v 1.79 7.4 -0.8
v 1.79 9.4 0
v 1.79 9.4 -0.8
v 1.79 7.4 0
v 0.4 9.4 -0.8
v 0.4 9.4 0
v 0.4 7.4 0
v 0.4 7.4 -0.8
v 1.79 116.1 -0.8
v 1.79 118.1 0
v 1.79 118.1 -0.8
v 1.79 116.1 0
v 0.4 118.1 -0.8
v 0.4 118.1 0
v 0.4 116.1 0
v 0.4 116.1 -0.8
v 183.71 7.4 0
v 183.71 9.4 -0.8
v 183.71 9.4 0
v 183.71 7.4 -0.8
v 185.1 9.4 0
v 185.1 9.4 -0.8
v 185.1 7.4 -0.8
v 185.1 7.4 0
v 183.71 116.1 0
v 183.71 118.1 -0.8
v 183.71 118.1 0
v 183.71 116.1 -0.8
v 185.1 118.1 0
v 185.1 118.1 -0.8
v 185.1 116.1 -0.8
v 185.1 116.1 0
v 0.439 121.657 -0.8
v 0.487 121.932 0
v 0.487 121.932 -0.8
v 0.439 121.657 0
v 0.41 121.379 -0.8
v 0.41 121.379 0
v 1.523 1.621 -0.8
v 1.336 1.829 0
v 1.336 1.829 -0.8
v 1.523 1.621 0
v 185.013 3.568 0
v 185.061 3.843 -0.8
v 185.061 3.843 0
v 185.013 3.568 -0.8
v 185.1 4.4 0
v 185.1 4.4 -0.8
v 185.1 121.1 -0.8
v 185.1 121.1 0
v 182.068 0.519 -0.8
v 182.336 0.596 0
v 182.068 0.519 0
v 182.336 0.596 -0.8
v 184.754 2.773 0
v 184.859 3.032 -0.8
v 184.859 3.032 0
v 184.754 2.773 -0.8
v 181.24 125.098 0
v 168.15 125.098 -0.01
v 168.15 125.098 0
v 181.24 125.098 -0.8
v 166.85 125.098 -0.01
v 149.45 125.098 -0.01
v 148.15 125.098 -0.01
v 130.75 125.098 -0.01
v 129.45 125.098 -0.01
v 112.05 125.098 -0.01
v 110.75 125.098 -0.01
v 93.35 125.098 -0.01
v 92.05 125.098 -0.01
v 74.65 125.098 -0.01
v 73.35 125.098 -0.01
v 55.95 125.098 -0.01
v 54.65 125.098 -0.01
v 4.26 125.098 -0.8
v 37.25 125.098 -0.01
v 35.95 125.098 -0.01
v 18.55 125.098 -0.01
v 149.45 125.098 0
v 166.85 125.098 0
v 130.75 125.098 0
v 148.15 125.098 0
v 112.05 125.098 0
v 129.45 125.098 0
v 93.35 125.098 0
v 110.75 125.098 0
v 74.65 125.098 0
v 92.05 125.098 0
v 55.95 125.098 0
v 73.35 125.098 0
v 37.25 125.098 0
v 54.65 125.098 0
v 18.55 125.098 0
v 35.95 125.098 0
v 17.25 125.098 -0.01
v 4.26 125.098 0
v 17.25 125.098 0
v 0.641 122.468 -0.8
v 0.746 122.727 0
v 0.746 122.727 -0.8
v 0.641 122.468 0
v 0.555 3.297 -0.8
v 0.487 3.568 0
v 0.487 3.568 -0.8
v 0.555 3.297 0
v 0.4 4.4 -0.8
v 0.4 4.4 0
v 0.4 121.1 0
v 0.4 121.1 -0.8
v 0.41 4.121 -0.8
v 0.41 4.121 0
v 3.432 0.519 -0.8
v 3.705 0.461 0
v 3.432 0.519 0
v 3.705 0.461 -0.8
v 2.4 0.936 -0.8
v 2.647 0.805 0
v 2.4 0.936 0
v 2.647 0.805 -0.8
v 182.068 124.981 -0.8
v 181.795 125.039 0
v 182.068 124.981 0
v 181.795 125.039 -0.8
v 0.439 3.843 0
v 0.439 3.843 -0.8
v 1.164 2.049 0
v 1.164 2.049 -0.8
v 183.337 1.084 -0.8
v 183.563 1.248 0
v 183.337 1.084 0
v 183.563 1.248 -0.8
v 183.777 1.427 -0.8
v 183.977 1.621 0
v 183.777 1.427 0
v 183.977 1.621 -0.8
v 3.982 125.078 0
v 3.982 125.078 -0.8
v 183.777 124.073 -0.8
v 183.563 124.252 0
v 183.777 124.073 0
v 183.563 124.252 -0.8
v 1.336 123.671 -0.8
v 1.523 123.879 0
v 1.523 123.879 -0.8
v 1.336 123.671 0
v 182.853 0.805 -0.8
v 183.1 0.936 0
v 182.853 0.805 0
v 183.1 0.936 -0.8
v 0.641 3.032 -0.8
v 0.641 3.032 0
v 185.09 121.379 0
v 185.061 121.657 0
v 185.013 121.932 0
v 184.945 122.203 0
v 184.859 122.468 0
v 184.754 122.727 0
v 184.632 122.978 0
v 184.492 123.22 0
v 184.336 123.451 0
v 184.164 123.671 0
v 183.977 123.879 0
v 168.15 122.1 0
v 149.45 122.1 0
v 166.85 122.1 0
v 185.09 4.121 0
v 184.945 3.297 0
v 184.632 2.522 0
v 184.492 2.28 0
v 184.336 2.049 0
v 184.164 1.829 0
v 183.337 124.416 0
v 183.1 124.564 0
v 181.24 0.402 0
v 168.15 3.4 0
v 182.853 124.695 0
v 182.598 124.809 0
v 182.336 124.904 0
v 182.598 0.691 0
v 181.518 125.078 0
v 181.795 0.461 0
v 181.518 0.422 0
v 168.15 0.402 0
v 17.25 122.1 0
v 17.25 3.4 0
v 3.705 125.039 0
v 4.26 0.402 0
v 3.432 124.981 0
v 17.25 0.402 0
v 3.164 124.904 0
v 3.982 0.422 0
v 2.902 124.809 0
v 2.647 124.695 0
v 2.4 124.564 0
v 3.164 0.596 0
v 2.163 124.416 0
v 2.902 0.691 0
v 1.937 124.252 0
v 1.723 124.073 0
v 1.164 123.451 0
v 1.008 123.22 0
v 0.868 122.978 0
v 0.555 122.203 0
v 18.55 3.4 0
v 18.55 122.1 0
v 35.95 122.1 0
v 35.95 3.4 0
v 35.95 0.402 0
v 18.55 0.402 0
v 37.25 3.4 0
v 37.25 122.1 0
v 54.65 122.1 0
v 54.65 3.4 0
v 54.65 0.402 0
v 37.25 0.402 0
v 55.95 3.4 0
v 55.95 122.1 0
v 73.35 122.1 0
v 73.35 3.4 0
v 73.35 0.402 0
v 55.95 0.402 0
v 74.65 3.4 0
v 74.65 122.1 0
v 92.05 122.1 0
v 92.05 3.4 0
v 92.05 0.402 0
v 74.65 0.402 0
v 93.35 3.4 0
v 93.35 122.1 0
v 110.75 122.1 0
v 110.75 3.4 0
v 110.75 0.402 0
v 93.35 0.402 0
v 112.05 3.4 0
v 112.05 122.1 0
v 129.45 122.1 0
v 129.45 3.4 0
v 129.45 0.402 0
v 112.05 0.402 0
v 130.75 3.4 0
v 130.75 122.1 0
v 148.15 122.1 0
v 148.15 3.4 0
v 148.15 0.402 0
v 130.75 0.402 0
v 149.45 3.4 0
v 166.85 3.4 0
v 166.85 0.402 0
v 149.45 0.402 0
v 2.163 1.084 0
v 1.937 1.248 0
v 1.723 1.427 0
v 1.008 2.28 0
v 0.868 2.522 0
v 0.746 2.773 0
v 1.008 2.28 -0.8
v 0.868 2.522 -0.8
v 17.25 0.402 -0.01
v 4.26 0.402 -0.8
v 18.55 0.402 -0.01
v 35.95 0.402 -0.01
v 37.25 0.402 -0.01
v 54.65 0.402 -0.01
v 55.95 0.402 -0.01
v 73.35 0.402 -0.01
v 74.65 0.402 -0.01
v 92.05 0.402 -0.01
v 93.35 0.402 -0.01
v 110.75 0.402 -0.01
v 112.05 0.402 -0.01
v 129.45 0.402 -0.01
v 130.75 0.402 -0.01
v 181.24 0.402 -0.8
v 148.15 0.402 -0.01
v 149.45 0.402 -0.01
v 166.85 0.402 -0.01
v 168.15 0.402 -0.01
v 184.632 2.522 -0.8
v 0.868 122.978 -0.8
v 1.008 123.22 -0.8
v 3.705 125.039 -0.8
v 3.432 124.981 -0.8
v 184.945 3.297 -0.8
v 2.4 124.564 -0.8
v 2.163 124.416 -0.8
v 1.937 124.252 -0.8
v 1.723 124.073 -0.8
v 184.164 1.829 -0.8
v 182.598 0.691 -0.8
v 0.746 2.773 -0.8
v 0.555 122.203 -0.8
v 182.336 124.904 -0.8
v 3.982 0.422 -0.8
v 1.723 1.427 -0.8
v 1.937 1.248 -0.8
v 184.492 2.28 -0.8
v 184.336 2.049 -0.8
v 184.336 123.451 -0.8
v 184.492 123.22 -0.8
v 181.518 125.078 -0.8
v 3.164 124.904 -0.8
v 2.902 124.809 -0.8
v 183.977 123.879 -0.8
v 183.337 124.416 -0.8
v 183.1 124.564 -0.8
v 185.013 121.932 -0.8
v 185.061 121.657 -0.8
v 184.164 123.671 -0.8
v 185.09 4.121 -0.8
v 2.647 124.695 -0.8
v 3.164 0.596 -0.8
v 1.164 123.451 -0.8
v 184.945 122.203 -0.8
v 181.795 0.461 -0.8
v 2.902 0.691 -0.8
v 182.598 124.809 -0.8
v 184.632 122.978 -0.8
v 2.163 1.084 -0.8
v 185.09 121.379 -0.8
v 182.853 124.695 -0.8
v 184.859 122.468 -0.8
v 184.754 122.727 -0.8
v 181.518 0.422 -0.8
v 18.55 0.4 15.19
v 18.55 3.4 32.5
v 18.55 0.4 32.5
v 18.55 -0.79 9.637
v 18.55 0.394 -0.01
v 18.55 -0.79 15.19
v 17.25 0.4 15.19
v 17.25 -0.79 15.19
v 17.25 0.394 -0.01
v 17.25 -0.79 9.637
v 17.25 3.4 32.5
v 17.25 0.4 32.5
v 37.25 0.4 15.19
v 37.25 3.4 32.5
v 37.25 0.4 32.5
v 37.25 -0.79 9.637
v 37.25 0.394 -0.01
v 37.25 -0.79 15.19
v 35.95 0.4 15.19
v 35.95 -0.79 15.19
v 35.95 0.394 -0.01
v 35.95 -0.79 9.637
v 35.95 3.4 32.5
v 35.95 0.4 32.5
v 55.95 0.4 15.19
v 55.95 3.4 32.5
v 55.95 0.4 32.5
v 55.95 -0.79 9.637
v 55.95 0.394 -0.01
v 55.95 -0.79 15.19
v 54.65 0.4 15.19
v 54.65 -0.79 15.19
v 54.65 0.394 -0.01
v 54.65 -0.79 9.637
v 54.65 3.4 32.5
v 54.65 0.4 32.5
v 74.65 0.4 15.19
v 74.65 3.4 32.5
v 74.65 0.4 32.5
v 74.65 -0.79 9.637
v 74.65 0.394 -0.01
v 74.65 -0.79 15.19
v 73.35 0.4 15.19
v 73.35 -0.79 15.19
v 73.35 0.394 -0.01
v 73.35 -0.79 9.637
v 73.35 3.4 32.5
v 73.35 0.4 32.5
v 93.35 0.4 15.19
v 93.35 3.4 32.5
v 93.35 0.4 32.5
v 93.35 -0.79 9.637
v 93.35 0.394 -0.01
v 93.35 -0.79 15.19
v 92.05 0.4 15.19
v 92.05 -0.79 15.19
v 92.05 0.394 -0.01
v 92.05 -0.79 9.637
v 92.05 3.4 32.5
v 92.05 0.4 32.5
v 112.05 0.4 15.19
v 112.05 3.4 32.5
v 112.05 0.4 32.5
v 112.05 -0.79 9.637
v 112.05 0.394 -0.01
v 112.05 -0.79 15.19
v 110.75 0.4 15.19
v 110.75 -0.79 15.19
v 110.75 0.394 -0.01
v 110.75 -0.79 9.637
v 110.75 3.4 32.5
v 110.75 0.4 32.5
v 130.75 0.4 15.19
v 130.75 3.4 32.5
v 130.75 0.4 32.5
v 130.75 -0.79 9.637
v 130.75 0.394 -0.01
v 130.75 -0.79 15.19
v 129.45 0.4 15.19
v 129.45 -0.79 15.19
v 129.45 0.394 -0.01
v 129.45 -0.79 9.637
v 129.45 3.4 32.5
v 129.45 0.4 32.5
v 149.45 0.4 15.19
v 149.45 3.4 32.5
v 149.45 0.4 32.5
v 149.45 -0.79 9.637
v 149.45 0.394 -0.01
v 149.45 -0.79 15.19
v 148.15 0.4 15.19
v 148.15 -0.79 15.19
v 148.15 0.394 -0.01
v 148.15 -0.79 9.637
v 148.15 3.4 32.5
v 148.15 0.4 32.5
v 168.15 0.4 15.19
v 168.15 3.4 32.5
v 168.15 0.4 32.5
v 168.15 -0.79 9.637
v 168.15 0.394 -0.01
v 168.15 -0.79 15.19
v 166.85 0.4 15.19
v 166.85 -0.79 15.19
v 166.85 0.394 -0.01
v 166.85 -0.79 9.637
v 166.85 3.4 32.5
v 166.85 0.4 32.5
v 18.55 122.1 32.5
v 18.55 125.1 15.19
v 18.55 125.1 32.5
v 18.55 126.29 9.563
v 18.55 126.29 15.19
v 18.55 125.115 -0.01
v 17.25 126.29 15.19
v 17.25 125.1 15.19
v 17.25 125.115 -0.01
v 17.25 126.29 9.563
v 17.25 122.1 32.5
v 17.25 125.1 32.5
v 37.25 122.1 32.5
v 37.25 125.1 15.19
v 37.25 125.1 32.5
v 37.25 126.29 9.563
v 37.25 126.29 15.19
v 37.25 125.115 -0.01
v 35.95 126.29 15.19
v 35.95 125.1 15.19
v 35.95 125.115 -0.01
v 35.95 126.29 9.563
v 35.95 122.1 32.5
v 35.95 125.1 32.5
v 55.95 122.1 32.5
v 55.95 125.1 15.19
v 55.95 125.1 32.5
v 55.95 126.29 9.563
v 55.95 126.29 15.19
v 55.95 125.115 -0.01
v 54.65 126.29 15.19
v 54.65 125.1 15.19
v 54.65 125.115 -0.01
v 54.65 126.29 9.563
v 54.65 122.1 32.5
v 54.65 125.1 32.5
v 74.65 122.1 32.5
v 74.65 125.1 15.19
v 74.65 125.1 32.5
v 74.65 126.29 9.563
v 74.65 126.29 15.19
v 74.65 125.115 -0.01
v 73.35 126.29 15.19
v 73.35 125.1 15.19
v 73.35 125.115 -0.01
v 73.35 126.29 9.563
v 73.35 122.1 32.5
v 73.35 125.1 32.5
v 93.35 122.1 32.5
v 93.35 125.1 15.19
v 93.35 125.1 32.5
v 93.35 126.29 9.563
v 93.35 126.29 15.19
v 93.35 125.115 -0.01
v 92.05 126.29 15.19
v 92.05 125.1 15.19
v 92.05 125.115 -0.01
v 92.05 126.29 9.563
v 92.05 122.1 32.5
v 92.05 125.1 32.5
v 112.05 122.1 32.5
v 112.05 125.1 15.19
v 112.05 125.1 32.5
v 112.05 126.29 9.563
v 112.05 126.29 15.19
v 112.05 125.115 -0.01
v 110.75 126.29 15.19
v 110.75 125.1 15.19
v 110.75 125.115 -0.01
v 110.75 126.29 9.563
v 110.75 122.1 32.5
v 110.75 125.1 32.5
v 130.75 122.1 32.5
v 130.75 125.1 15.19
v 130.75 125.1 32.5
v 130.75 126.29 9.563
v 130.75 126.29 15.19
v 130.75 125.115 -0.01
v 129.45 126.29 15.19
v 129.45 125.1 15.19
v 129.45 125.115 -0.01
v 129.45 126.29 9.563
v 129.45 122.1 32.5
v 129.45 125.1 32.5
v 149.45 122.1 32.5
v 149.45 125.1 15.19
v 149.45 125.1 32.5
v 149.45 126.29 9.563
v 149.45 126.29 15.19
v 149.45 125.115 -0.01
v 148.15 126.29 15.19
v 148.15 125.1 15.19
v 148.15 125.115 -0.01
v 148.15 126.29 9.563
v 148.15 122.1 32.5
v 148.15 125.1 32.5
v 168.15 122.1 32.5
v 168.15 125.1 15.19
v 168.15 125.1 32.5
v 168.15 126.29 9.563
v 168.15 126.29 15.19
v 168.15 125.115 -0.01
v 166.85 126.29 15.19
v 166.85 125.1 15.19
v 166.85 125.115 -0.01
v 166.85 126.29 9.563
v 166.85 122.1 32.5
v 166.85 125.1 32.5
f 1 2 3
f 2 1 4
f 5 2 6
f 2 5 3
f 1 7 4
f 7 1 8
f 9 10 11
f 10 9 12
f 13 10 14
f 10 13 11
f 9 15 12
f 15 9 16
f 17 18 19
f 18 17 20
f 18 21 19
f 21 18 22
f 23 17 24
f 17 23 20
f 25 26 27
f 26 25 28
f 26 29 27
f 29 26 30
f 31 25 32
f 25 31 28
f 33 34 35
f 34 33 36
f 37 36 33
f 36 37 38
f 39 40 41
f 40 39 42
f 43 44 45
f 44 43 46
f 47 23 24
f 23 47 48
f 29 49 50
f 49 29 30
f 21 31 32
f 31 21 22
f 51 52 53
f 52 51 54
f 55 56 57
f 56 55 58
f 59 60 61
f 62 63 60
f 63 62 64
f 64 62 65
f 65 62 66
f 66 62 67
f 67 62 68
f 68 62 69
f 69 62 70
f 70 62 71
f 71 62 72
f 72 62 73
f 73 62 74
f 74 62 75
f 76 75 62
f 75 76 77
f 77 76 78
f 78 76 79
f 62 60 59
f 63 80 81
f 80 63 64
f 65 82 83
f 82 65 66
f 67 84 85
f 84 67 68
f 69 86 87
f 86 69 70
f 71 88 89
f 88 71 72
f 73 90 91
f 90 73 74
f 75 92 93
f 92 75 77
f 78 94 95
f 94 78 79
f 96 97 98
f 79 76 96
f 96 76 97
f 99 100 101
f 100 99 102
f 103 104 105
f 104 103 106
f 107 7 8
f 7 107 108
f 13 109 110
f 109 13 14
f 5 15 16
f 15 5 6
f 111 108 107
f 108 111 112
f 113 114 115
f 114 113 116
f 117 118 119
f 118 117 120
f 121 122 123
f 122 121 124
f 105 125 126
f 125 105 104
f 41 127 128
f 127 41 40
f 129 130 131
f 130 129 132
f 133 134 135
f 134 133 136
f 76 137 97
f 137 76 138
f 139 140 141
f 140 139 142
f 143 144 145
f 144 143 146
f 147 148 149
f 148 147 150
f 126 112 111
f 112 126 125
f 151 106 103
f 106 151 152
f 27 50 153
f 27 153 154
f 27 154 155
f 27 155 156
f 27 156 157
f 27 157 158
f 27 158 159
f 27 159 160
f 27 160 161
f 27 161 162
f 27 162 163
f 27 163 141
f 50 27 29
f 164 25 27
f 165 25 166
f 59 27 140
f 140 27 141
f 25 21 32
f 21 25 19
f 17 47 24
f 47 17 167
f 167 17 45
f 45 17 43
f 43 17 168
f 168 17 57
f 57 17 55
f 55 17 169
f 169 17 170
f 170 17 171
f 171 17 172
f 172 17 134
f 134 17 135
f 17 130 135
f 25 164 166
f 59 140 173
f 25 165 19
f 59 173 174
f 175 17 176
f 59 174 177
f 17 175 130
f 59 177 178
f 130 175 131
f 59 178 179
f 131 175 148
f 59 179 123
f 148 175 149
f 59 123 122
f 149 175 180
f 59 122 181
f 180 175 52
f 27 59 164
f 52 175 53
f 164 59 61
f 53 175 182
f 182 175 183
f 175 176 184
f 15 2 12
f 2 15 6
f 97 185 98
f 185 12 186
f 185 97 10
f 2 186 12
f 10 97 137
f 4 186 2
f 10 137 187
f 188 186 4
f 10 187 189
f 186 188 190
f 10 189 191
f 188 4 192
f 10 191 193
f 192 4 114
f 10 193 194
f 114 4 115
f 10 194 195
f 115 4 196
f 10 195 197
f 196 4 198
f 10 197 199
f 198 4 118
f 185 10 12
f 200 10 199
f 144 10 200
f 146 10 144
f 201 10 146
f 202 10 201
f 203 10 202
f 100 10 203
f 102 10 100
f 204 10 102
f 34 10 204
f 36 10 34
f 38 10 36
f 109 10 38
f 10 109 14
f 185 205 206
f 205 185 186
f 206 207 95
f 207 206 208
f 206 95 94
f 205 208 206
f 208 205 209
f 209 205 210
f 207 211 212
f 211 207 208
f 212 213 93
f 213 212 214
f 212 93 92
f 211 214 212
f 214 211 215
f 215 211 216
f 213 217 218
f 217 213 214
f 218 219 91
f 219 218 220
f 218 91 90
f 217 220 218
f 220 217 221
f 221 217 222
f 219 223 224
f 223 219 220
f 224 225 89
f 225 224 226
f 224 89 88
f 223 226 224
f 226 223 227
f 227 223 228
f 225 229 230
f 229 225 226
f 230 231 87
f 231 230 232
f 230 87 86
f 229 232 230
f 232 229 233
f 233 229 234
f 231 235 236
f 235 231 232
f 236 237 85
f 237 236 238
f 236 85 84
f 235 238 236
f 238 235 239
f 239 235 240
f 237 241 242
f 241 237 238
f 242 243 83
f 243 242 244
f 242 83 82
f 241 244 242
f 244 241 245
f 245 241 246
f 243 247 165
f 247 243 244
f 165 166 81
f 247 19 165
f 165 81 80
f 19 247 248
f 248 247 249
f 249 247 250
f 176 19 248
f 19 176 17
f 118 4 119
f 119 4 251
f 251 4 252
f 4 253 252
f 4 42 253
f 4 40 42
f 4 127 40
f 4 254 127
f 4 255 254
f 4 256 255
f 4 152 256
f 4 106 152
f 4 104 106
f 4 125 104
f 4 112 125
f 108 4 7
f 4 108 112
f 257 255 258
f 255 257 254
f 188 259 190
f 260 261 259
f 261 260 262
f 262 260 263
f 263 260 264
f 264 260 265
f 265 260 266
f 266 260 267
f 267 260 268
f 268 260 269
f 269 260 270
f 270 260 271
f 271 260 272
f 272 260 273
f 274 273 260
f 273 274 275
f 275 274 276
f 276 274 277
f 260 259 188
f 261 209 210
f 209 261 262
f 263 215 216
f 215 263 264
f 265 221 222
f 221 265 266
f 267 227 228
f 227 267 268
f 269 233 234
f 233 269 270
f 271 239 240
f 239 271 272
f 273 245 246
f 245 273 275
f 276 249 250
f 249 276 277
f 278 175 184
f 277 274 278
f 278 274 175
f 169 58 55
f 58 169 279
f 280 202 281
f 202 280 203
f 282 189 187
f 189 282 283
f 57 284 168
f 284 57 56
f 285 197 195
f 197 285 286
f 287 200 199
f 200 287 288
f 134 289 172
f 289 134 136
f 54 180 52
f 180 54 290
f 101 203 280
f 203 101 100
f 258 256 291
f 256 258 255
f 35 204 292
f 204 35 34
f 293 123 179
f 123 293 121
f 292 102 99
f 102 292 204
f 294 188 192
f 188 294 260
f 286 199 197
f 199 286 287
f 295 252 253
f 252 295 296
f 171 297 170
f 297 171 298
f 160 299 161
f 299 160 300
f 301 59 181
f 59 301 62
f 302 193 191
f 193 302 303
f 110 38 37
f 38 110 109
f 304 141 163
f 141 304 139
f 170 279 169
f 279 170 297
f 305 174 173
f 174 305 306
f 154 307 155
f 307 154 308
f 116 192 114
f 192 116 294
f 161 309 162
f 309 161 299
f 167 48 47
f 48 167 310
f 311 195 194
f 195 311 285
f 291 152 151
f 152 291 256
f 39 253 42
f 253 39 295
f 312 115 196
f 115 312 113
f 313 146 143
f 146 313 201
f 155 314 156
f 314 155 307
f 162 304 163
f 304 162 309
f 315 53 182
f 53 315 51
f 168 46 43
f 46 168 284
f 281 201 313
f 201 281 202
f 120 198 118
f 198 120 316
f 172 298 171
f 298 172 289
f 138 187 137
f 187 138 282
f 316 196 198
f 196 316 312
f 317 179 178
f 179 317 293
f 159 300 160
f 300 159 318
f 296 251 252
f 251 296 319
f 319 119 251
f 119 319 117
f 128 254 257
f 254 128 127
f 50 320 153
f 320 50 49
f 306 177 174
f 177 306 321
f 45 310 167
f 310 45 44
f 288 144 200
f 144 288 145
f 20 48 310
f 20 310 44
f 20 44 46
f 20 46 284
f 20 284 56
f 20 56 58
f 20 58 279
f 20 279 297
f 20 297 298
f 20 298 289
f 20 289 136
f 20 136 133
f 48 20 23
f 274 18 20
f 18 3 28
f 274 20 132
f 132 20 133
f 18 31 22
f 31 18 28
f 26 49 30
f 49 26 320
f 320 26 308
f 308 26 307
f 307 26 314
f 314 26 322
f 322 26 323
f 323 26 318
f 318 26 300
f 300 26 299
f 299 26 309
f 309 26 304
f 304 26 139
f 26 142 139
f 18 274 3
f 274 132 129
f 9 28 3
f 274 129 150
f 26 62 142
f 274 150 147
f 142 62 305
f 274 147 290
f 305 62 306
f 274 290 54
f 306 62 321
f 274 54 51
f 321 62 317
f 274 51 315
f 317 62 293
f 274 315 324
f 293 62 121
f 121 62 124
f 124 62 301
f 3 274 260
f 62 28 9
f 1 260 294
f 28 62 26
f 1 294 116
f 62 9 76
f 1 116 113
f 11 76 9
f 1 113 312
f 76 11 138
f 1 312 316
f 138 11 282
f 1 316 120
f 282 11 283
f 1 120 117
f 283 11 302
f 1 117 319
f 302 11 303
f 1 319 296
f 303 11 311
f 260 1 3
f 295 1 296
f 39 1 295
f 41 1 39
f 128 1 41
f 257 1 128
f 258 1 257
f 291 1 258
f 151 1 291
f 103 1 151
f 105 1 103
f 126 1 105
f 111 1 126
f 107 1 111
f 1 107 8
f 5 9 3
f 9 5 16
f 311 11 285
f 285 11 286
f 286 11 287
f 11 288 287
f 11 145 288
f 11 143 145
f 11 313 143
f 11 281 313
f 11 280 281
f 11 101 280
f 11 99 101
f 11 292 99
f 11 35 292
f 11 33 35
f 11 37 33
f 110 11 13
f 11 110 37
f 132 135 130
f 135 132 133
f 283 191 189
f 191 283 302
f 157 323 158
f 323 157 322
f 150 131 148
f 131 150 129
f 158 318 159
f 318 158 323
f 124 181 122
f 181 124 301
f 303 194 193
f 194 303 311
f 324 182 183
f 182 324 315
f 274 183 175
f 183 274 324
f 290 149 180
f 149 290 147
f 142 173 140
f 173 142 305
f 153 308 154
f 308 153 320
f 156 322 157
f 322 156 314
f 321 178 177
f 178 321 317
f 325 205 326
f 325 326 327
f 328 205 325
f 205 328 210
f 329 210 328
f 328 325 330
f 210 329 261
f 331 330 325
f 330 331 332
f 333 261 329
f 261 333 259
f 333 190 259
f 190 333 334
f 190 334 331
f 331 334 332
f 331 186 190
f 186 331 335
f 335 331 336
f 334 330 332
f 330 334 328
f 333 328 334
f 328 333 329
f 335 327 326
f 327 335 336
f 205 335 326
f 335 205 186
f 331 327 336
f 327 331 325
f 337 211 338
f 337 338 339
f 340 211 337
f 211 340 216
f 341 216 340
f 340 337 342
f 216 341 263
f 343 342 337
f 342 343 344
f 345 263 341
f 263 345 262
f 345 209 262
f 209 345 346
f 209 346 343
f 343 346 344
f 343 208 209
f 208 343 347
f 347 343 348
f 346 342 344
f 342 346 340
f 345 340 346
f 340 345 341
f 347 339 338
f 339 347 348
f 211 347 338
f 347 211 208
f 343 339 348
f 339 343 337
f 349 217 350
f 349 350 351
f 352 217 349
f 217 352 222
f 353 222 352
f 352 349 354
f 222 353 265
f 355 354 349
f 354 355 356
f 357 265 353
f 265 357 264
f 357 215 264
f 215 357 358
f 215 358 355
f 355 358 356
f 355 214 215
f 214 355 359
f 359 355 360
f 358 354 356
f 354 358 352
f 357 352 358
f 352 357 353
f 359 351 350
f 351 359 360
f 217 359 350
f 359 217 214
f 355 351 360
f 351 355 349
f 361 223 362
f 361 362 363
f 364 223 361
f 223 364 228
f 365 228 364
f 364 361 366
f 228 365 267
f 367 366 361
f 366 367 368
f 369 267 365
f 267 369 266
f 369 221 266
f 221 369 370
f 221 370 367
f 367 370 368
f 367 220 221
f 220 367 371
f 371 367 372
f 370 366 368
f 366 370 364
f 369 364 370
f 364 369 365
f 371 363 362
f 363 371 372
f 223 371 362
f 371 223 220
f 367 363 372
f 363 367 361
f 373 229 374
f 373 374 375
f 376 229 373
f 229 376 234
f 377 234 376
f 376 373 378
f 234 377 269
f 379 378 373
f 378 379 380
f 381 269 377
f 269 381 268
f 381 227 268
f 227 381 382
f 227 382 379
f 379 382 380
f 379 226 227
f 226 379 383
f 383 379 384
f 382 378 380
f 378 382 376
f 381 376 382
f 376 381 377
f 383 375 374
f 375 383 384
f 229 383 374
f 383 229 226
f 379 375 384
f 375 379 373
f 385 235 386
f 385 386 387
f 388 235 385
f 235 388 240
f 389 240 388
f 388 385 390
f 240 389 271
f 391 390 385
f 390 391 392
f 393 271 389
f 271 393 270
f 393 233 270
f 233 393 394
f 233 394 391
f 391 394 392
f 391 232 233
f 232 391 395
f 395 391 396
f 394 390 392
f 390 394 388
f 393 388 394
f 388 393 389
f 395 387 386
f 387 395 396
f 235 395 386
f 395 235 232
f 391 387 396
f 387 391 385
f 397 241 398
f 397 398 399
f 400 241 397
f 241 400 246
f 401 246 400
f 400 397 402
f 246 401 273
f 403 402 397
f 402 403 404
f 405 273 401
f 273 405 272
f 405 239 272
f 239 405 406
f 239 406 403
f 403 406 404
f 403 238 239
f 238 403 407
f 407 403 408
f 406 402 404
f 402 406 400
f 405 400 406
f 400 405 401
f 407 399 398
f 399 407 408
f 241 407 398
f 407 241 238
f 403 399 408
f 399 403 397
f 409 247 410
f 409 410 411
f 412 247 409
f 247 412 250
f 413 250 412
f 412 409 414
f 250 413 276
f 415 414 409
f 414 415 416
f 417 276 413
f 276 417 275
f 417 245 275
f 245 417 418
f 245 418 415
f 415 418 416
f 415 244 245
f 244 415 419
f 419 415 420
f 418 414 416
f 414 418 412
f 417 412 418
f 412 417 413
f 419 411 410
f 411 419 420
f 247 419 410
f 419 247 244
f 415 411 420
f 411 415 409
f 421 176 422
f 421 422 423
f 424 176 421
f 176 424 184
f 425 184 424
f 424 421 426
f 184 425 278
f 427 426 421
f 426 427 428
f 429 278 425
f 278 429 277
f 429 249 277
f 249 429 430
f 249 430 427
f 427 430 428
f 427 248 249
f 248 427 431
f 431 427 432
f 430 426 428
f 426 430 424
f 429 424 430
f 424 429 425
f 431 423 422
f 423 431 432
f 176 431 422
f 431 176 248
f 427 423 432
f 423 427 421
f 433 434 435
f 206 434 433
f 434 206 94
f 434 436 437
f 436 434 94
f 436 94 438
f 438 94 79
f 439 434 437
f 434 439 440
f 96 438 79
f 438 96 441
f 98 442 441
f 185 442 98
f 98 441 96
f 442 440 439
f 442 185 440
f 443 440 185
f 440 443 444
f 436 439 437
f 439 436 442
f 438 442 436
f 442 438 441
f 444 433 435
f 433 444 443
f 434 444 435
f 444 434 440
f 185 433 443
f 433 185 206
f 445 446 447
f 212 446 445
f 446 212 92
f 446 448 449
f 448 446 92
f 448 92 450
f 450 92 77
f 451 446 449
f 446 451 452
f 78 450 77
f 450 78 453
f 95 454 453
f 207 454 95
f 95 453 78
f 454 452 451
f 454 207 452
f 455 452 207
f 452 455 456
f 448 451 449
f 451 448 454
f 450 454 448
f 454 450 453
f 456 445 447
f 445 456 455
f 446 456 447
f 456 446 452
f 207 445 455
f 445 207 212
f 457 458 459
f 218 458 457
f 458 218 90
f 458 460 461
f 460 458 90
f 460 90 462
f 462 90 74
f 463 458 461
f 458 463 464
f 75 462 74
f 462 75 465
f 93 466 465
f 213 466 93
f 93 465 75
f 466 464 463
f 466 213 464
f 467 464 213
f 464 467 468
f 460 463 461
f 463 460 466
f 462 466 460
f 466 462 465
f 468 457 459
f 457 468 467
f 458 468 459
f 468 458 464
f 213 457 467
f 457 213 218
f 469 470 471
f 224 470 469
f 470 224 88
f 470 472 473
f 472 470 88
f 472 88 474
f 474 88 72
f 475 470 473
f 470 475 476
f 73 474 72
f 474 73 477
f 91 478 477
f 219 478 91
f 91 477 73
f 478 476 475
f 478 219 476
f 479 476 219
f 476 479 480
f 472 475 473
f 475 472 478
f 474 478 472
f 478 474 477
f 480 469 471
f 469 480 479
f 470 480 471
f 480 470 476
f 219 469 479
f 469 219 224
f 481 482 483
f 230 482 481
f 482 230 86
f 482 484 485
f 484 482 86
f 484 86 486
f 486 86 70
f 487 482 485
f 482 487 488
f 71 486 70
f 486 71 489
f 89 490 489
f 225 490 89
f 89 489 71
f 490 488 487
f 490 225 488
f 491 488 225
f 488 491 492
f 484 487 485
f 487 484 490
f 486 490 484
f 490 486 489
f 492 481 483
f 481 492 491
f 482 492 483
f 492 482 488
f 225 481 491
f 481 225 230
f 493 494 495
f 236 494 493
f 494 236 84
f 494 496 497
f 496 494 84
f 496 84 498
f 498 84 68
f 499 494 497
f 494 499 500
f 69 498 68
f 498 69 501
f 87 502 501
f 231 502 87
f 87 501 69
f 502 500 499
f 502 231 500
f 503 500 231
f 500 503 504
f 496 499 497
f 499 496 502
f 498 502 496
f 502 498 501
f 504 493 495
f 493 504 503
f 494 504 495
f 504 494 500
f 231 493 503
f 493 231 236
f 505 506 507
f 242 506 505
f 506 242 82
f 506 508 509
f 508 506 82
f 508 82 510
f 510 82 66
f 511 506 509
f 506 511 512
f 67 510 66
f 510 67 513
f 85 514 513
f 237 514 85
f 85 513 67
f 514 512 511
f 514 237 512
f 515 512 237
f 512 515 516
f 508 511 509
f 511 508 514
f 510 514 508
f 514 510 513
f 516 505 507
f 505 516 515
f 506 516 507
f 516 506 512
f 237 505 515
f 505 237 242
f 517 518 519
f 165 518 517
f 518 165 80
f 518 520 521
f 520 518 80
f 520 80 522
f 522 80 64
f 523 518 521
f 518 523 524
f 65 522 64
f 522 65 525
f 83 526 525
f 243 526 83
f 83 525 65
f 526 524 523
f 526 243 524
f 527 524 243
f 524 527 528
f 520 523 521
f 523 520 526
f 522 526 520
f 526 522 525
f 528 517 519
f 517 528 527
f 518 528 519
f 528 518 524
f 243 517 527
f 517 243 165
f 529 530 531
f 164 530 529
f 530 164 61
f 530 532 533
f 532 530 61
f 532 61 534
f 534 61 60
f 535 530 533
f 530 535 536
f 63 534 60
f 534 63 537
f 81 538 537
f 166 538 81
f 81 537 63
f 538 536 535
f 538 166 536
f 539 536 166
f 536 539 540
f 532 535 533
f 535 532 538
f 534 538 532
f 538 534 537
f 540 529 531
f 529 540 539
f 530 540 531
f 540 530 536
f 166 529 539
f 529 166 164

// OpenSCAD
// file: ../../Base/Constants.scad
// Fischertechnik Box Foundation
// Constants

// Constant values necessary for multiple elements

// Base constants
dividerThickness = 1.2;
excess = 0.01;
fragments = 90;
tolerance = 0.8;

// Gets the thickness of a divider 
function getDividerThickness() = dividerThickness;

// Gets the excess that is used to merge walls into each other
function getExcess() = excess;

// Gets amount of fragments of a cylinder
function getFragments() = fragments;

// Gets the inner tolerance of a frame to each side
function getTolerance() = tolerance;


// Fischertechnik specific constants
axisDiameter = 4;
axisBottomDiameter = axisDiameter + 1;
axisTolerance = 0.2;

// Gets axis diameter of Fischertechnik axis
function getAxisDiameter() = axisDiameter;

// Gets axis diameter tolerance (subtracted for element axis)
function getAxisTolerance() = axisTolerance;

// Gets the axis diameter for standing axis
function getStandAxisDiameter() = getAxisDiameter() - getAxisTolerance();

// Gets axis bottom diameter for thicker part at the bottom
function getAxisBottomDiameter() = axisBottomDiameter;

standardEdgeDistance = 2.5;
standardWebDistance = 11.5;
standardCornerLength = 15;

// gets the standard distance to the wall of the box for dockable frames with webs
function getStandardEdgeDistance() = standardEdgeDistance;

// gets the standard distance of each web to the corner of the dockable frame
function getStandardWebDistance() = standardWebDistance;

// gets the standard length of the corner walls of a dockable frame
function getStandardCornerLength() = standardCornerLength;

tubeWallFactor = 0.8;

// gets the wall thickness of a tube.
function getTubeWallThickness() = tubeWallFactor * getDividerThickness();

smallPartsFrameHeight = 20;

// gets the frame height for docked small parts boxes.
function getSmallPartsFrameHeight() = smallPartsFrameHeight;

hubRingDiameter = 19.5;
hubRingLevelDiameter = 21;

// gets the diameter of a tube matching the inner ring of a wheel
function getHubRingDiameter() = hubRingDiameter;

// gets the diameter of a hub tube with a thicker diameter
function getHubRingLevelDiameter() = hubRingLevelDiameter;
// file: ../../Base/PlacementOptions.scad
// Fischertechnik Box Foundation
// Placement Options

// Alignment
NoAlign = 0;
AlignLeft = 1;
AlignBottom = 2;
AlignCenter = 3;
AlignRight = 4;
AlignTop = 5;

// Element rotation degree steps
rotations = [0, -90, -180, -270];

// Rotation
NoRotation = 0;
Rotate0 = 0;
Rotate90 = 1;
Rotate180 = 2;
Rotate270 = 3;

// Docking (seen from above)
NoDock = -1;
DockLeft = 0;
DockTop = 1;
DockRight = 2;
DockCorner = 2;
DockBottom = 3;

// Web corners
LowerLeft = 0;
UpperLeft = 1;
UpperRight = 2;
LowerRight = 3;

// Web position relative to corner
LeftOfCorner = 0;
RightOfCorner = 1;
// file: ../../Base/BoxInlays.scad
// Fischertechnik Box Foundation
// Box Inlays for Original Sorting Boxes

use <Constants.scad>
use <Boxes.scad>

include <PlacementOptions.scad>

box500Width = 380;
box500Depth = 190;

baseThickness = 0.8;
radius = 4;

// getInlayBaseSpace(space)
// Gets the usable space of an inlay with the specified size.
// space = The size of the bottom of the inlay without tolerance

function getInlayBaseSpace(space) = [space.x - getTolerance(), space.y - getTolerance()];

// Creates the bottom with the specified size.
// space = The size of the bottom

module InlayBase(space) {
    module WebCutoffs() {
        distance = 7;
        width = 1.4;
        depth = 2;
        thickness = baseThickness * 2;
        cutoffVolume = [width, depth, thickness];

        translate([0, 0, -baseThickness/2]) {
            translate([-getExcess(), 0]) {
                translate([0, distance])
                    cube(cutoffVolume);
                translate([0, getInlayBaseSpace(space).y - distance - depth])
                    cube(cutoffVolume);
            }
            translate([getInlayBaseSpace(space).x - width + getExcess(), 0]) {
                translate([0, distance])
                    cube(cutoffVolume);
                translate([0, getInlayBaseSpace(space).y - distance - depth])
                    cube(cutoffVolume);
            }
        }
    }

    difference() {
        RoundedCornerPlate(space.x - getTolerance(), space.y - getTolerance(), baseThickness, radius);
        WebCutoffs();
    }
}

halfTolerance = getTolerance()/2;

// Creates an inlay for the Fischertechnik empty box 130x190 mm and places it at position 0,0
// The inlay consists of a thin layer at the bottom where the elements are placed. Use 
// Box190InlayWeb to place webs that hold the inlay in position.

module Box190Inlay() {
    translate([halfTolerance, halfTolerance, -baseThickness]) {            
        InlayBase(getBox190Space());
    }
}

inlayWebDepth = 3;

// Box190InlayWeb(align, position)
// Creates a web for snapping the inlay into the box. Use multiple webs per side.
// align = AlignTop or AlignBottom
// position = Index of the recess in the boy where to snap in (from left to right)
// inlayWebDepth = Depth of the web (default is 3 mm)

module Box190InlayWeb(align, position, inlayWebDepth=inlayWebDepth) {

    inlayWebThickness = 1.3;
    inlayWebHeight = getBoxUsageHeight();    
    
    inlayWebRecessHeight = 15.6;
    inlayWebRecessDepth = 1.2;
    inlayWebRecessAngle = 7.0;

    inlayWebRecessWidth = 1.4;
    inlayWebCount = 9;
    inlayWebCompleteWidth = 151.0;
    inlayWebDistance = (inlayWebCompleteWidth - inlayWebCount * inlayWebRecessWidth) / (inlayWebCount - 1) + inlayWebRecessWidth;
    inlayWebStart = (getBox190Space().x - inlayWebCompleteWidth) / 2;

    module InlayWeb() {
        cube([inlayWebThickness, inlayWebDepth, inlayWebHeight + getExcess()]);
        translate([0, align==AlignTop ? (inlayWebDepth-getExcess()) : (getExcess()-inlayWebRecessDepth)]) {
            difference() {
                cube([inlayWebThickness, inlayWebRecessDepth, inlayWebRecessHeight - halfTolerance]);
                translate([-getExcess(), 0, -0.2])
                    rotate([align==AlignTop ? -inlayWebRecessAngle : inlayWebRecessAngle,0,0])
                        cube([inlayWebThickness+2*getExcess(), inlayWebRecessDepth, inlayWebRecessHeight]);
            }
        }
    }
    
    x = inlayWebStart + position * inlayWebDistance;
    y = (align == AlignTop) ? (getBox190Space().y - inlayWebDepth - halfTolerance) : halfTolerance;

    translate([x, y, -getExcess()])
        InlayWeb();
}
// file: ../../Base/Boxes.scad
// Fischertechnik Box Foundation
// Pre-designed Boxes

use <Constants.scad>

include <PlacementOptions.scad>

box190Width = 190;
box190Depth = 130;
box130Width = 130;
box130Depth = 95;

// Values are from an original ec3 box
topBottomDifference = 1.5;
outerHeight = 40;
innerHeight = 38.2;
baseThickness = outerHeight - innerHeight;
stackExcess = 5.7;
radius = 3.5;
wallThickness = 1.5;
tolerance = 0.2;
stackOffset = innerHeight - stackExcess;

boxUsageHeight = stackOffset;
boxWallThickness = wallThickness;
boxBaseThickness = baseThickness;
boxWebWidth = 3.0;

// getBoxWallThickness()
// Gets the wall thickness of a Fischertechnik Box
function getBoxWallThickness() = boxWallThickness;

// getBoxUsageHeight()
// Gets the usable height of a Fischertechnik box
function getBoxUsageHeight() = boxUsageHeight;

// getBoxInnerHeight()
// Gets the inner height of a Fischertechnik box, including the stack excess
function getBoxInnerHeight() = innerHeight;

// getBoxBaseThickness()
// Gets the thickness of the Fischertechnik box base.
function getBoxBaseThickness() = boxBaseThickness;

// getBoxWebWidth()
// Gets the width of a box web
function getBoxWebWidth() = boxWebWidth;

// getBox190Space()
// Gets the usable inner space of a Box 190 as an x/y-list
function getBox190Space() = [
    box190Width - 2*getBoxWallThickness() - topBottomDifference, 
    box190Depth - 2*getBoxWallThickness() - topBottomDifference ];

// RoundedCornerPlate(width, depth, height, radius)
// Creates a body plate with rounded corners for a box. Used
// also to create the complete box with the hull module.
// width = Width of the plate
// depth = depth of the plate 
// height = thickness of the plate
// radius = radius of the rounded corner
module RoundedCornerPlate(width, depth, height, radius) {
    translate([radius, radius])
    hull() {
        w = width-2*radius;
        d = depth-2*radius;
        cube([w, d, height]);
        cylinder(height, r=radius, $fn=getFragments());
        translate([w, 0])
            cylinder(height, r=radius, $fn=getFragments());
        translate([w, d])
            cylinder(height, r=radius, $fn=getFragments());
        translate([0, d])
            cylinder(height, r=radius, $fn=getFragments());
    }
}

// BoxBase(width, depth)
// Creates an empty stackable Fischertechnik compatible box
// width = Outer width of the box (190, 130, ...)
// depth = Outer depth of the box (130, 95, ...)

module BoxBase(width, depth, height=outerHeight) {    
    thinPlate = 0.01;

    innerHeight = height - baseThickness;    
    
    module Body(tolerance=tolerance) {
        hull() {
            // Bottom with tolerance to fit into the original boxes when stacked
            translate([-wallThickness+tolerance, -wallThickness+tolerance, -baseThickness])
                RoundedCornerPlate(width-topBottomDifference-2*tolerance, depth-topBottomDifference-2*tolerance, thinPlate, radius);
            
            // Top
            translate([-wallThickness-topBottomDifference/2, -wallThickness-topBottomDifference/2, innerHeight-thinPlate])
                RoundedCornerPlate(width, depth, thinPlate, radius);
         }
    }

    module Cutoff() {
        hull() {
            coWidth = width - 2*wallThickness;
            coDepth = depth - 2*wallThickness;
            
            // Bottom
            RoundedCornerPlate(coWidth-topBottomDifference, coDepth-topBottomDifference, thinPlate, radius);

            // Top
            translate([-topBottomDifference/2, -topBottomDifference/2, innerHeight+thinPlate]) 
                RoundedCornerPlate(coWidth, coDepth, thinPlate, radius);
        }
    }
    
    difference() {        
        Body();
        Cutoff();
        stackOffset = innerHeight - stackExcess;
        translate([0, 0, stackOffset + baseThickness])
            Body(tolerance=0);
    }
}

// Creates the Fischertechnik empty box 130x190 mm and places it at position 0,0
// 190x130 are the outer sizes, the inner space is slightly smaller. Use getBox190Space() to get the inner sizes.
// The box is positioned that the usable inner space is at the 0,0,0 position.

module Box190() {
    BoxBase(box190Width, box190Depth);
}

// Gets the usable inner space of a Box 130 as an x/y-list
function getBox130Space() = [
    box130Width - 2*getBoxWallThickness() - topBottomDifference, 
    box130Depth - 2*getBoxWallThickness() - topBottomDifference ];

// Creates the Fischertechnik empty box 95x130 mm and places it at position 0,0
// 190x130 are the outer sizes, the inner space is slightly smaller. Use getBox190Space() to get the inner sizes.
// The box is positioned that the usable inner space is at the 0,0,0 position.

module Box130() {
    BoxBase(box130Width, box130Depth);
}

// Creates a web at the specified box walls
// corner 0 = LowerLeft, 1 = UpperLeft, 2 = UpperRight, 3 = LowerRight
// side 0 = LeftOfCorner, 1 = RightOfCorner
// distance = Distance in mm from the corner
// boxSpace = inner width and depth of the box (default: Box 190)
// webWidth = length of the web (default is 3 mms)
// webThickness = thickness of the web (default is 1 mm)

module BoxWeb(corner, side, distance, boxSpace=getBox190Space(), webWidth=getBoxWebWidth(), webThickness=1.0) {
    sink = getBoxWallThickness()/2;

    width = (corner % 2 == 0) ? 
            (side == LeftOfCorner ? webWidth : webThickness) :
            (side == LeftOfCorner ? webThickness : webWidth);

    depth = (corner % 2 == 0) ? 
            (side == RightOfCorner ? webWidth : webThickness) :
            (side == RightOfCorner ? webThickness : webWidth);
    
    xDiff = corner == LowerLeft ? 
                (side == LeftOfCorner ? -sink : distance) :
            (corner == UpperLeft ?                
                (side == LeftOfCorner ? distance : -sink) :
            (corner == UpperRight ?
                (side == LeftOfCorner ? boxSpace.x-webWidth+sink : boxSpace.x-distance-webThickness) :
                (side == LeftOfCorner ? boxSpace.x-distance-webThickness: boxSpace.x-webWidth+sink)));

    yDiff = corner == LowerLeft ? 
                (side == RightOfCorner ? -sink : distance) :
            (corner == UpperLeft ?
                (side == RightOfCorner ? boxSpace.y-distance-webThickness : boxSpace.y-webWidth+sink) :
            (corner == UpperRight ?
                (side == RightOfCorner ? boxSpace.y-webWidth+sink : boxSpace.y-distance-webThickness) :
                (side == RightOfCorner ? distance : -sink)));
    
    translate([xDiff, yDiff, -getExcess()])
        cube([width, depth, boxUsageHeight + 2*getExcess()]);
}
// main file
// Fischertechnik Box Foundation
// BoxeInlays Test
// 3D Print Test Box190Inlay

use <../../Base/Boxes.scad>
use <../../Base/BoxInlays.scad>

include <../../Base/PlacementOptions.scad>

difference() {
    Box190Inlay();
    // Inner cutoff to save filament
    translate([1.9, 1.3, -1])
        scale([0.9, 0.9, 1.1])
            Box190Inlay();
}

Box190InlayWeb(AlignBottom, 0);
Box190InlayWeb(AlignBottom, 1);
Box190InlayWeb(AlignBottom, 2);
Box190InlayWeb(AlignBottom, 3);
Box190InlayWeb(AlignBottom, 4);
Box190InlayWeb(AlignBottom, 5);
Box190InlayWeb(AlignBottom, 6);
Box190InlayWeb(AlignBottom, 7);
Box190InlayWeb(AlignBottom, 8);

Box190InlayWeb(AlignTop, 0);
Box190InlayWeb(AlignTop, 1);
Box190InlayWeb(AlignTop, 2);
Box190InlayWeb(AlignTop, 3);
Box190InlayWeb(AlignTop, 4);
Box190InlayWeb(AlignTop, 5);
Box190InlayWeb(AlignTop, 6);
Box190InlayWeb(AlignTop, 7);
Box190InlayWeb(AlignTop, 8);
